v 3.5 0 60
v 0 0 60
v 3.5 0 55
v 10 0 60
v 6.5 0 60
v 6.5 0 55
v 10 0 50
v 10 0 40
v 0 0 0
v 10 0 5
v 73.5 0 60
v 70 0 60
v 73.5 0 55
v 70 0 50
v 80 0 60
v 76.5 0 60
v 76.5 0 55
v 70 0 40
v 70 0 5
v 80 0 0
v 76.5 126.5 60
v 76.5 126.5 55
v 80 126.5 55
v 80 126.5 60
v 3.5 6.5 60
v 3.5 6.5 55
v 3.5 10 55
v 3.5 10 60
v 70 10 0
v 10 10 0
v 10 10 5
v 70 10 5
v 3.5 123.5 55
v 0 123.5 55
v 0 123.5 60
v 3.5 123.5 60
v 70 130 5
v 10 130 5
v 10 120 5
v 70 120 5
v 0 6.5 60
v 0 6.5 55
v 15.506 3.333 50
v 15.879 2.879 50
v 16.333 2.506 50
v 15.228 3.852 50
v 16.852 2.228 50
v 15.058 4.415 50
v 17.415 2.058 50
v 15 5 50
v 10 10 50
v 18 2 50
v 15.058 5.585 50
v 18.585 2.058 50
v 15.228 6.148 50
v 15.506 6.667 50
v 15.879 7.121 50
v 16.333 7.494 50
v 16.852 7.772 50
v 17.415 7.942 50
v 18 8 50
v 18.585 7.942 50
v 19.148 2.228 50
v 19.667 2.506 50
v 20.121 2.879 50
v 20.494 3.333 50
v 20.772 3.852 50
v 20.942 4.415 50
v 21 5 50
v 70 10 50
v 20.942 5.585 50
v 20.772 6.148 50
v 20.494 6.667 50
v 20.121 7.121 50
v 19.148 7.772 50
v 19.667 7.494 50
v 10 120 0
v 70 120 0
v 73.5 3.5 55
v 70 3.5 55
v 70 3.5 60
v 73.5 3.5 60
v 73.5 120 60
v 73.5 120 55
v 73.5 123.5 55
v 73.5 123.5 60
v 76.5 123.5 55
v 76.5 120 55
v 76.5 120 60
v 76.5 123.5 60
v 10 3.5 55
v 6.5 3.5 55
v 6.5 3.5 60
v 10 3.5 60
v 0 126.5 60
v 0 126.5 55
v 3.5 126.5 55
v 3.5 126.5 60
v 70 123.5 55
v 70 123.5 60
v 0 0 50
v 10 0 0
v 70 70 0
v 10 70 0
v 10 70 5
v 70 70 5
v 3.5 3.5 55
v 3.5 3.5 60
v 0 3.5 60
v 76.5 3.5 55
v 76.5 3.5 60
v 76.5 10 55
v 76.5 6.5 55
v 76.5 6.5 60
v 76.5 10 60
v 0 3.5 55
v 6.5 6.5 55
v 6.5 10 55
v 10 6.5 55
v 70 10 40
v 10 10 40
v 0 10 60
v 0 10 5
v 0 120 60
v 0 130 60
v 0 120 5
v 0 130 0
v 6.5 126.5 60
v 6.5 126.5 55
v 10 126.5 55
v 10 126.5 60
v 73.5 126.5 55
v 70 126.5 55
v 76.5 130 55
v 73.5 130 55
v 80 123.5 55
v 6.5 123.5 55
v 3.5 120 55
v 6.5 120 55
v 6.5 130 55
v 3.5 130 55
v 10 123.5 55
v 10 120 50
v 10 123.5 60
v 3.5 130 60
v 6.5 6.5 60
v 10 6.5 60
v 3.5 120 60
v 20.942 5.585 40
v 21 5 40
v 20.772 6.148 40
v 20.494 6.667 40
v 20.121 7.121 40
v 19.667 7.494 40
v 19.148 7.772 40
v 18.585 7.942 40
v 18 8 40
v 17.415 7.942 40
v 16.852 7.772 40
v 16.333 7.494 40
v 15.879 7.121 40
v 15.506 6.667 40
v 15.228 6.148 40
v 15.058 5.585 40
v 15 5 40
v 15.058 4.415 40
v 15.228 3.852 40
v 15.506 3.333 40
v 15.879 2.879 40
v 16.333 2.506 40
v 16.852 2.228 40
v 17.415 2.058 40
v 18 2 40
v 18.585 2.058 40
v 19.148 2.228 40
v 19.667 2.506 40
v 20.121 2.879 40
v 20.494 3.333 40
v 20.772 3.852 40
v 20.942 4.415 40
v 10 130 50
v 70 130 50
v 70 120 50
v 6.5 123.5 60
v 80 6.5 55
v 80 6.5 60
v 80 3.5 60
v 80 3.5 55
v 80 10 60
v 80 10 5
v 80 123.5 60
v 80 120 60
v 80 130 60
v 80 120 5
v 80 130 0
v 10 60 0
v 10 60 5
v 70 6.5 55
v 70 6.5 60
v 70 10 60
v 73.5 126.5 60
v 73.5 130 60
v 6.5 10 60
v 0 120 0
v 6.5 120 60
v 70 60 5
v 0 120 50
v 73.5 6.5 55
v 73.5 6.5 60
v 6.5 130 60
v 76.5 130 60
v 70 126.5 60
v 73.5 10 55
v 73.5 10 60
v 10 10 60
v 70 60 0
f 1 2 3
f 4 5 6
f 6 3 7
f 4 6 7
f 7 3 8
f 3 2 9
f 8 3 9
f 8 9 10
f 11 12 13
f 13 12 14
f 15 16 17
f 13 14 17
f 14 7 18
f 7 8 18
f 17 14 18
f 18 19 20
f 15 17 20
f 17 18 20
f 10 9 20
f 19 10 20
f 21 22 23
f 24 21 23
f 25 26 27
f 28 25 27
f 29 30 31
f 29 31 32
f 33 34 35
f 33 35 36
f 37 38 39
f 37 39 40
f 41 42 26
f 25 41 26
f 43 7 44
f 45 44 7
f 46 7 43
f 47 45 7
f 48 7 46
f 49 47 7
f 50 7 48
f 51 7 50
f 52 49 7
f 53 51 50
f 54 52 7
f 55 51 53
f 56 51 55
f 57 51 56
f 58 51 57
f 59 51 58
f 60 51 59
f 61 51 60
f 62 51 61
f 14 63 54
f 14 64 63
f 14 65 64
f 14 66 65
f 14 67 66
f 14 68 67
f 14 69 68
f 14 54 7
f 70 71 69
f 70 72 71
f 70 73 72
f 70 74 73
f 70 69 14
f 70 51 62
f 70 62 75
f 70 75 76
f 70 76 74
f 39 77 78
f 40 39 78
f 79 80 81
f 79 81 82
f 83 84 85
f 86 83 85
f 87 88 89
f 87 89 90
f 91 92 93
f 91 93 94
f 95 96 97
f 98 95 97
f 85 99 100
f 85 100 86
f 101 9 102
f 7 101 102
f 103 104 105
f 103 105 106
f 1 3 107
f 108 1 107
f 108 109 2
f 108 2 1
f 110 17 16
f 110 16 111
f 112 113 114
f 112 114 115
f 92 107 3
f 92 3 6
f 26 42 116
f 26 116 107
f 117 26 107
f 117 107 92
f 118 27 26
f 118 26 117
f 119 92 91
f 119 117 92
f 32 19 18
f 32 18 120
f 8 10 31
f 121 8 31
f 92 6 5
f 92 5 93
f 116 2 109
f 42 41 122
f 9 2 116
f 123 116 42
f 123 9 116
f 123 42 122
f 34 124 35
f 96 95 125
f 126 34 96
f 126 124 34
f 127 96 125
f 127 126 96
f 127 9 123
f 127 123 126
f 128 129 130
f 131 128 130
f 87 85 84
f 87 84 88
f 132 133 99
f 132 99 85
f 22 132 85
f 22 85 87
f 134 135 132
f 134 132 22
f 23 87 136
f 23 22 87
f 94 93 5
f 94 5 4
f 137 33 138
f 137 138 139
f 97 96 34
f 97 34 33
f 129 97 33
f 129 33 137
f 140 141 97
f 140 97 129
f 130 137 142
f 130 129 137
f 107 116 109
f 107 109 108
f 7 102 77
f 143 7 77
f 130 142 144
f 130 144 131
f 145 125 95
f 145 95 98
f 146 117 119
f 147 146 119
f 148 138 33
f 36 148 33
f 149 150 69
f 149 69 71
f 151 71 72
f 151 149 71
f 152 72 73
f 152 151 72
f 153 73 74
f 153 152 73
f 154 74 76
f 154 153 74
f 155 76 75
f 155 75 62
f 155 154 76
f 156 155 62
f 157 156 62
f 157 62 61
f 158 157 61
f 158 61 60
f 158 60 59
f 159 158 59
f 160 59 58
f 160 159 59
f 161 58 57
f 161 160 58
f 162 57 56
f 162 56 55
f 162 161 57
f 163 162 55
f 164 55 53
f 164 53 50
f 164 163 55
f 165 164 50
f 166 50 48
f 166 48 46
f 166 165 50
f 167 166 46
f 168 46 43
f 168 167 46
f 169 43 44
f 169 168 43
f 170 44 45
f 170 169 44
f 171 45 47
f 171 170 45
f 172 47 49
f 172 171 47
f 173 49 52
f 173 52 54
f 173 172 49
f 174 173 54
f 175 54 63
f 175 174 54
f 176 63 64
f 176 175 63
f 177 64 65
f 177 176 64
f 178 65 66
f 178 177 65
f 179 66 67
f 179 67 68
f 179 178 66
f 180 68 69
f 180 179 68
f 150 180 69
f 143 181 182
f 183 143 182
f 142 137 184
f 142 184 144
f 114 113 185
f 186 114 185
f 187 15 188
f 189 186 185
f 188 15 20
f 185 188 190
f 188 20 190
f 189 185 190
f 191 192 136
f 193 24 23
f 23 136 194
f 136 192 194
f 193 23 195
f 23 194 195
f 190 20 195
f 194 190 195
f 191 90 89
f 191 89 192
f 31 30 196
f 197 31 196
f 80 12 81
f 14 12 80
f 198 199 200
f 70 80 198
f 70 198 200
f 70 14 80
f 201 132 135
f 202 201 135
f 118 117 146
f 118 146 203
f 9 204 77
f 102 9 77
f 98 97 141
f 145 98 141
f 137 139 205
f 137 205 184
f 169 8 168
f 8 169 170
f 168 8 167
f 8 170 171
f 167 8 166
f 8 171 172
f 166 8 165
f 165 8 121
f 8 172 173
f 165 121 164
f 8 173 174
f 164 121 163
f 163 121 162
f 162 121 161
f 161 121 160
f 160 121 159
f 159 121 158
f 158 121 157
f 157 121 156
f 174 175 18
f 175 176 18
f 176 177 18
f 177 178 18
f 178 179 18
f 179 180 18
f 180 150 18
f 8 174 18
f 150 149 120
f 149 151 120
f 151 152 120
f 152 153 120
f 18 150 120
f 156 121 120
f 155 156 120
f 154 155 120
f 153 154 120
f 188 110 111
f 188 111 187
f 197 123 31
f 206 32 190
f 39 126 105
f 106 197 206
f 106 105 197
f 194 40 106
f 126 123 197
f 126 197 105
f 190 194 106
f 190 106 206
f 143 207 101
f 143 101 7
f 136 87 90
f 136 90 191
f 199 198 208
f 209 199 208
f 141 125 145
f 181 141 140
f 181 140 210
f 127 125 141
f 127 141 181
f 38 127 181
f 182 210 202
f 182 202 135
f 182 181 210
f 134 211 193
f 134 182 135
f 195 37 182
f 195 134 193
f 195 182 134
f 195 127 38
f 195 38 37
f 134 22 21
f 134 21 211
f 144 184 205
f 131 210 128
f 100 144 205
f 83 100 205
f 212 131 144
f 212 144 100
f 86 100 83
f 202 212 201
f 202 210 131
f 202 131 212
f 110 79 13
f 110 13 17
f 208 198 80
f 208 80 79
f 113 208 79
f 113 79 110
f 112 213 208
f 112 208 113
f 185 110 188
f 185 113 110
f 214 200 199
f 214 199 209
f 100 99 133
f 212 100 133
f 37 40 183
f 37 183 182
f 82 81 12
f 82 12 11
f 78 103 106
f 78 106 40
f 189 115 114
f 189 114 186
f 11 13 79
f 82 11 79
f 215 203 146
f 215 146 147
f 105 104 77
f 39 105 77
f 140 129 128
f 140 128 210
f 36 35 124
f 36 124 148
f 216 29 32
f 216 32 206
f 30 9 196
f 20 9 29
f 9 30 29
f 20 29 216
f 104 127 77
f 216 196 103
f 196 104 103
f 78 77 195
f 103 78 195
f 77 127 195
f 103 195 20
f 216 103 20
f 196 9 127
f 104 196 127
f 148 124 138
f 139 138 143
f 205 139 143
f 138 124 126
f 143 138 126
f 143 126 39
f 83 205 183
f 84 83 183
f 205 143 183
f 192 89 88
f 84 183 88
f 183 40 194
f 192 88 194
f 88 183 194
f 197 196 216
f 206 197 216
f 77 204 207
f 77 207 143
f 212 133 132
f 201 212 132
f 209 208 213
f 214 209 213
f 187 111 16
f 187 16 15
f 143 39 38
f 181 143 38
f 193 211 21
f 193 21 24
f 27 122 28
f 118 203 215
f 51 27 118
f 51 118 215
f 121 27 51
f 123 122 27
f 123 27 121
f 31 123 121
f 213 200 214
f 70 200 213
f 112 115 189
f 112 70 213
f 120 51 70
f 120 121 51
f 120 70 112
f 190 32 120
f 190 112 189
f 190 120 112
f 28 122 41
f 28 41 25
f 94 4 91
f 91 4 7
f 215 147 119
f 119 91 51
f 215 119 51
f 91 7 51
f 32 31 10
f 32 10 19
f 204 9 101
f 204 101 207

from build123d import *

# Parameters (mm, degrees)
BOX009_W       = 10
BOX009_H       = 120
BOX009_DEPTH   = 50
BOX010_W       = 3
BOX010_H       = 10
BOX010_DEPTH   = 5
BOX011_W       = 10
BOX011_H       = 3
BOX011_DEPTH   = 5
BOX012_W       = 3
BOX012_H       = 10
BOX012_DEPTH   = 5
BOX013_W       = 10
BOX013_H       = 3
BOX013_DEPTH   = 5
BOX014_W       = 3
BOX014_H       = 10
BOX014_DEPTH   = 5
BOX015_W       = 10
BOX015_H       = 3
BOX015_DEPTH   = 5
BOX016_W       = 3
BOX016_H       = 10
BOX016_DEPTH   = 5
BOX017_W       = 10
BOX017_H       = 3
BOX017_DEPTH   = 5
BOX003_W       = 10
BOX003_H       = 10
BOX003_DEPTH   = 60
BOX004_W       = 10
BOX004_H       = 10
BOX004_DEPTH   = 60
BOX005_W       = 10
BOX005_H       = 10
BOX005_DEPTH   = 60
BOX006_W       = 10
BOX006_H       = 10
BOX006_DEPTH   = 60
BOX008_W       = 80
BOX008_H       = 10
BOX008_DEPTH   = 10
BOX001_W       = 60
BOX001_H       = 50
BOX001_DEPTH   = 5
BOX002_W       = 60
BOX002_H       = 50
BOX002_DEPTH   = 5
BOX_W          = 80
BOX_H          = 130
BOX_DEPTH      = 5
CYLINDER_R     = 3
CYLINDER_DEPTH = 10
BOX007_W       = 80
BOX007_H       = 10
BOX007_DEPTH   = 10


with BuildPart() as cube009:
    # Box009 → Box009 (new body)
    with BuildSketch(Plane.XY):
        with Locations((5, 60)):
            Rectangle(BOX009_W, BOX009_H)
    extrude(amount=BOX009_DEPTH)


with BuildPart() as cube010:
    # Box010 → Box010 (new body)
    with BuildSketch(Plane(origin=(3.5, 0, 55), x_dir=(1, 0, 0), z_dir=(0, 0, 1))):
        with Locations((1.5, 5)):
            Rectangle(BOX010_W, BOX010_H)
    extrude(amount=BOX010_DEPTH)


with BuildPart() as fusion001:
    # Box011 → Box011 (new body)
    with BuildSketch(Plane(origin=(0, 3.5, 55), x_dir=(1, 0, 0), z_dir=(0, 0, 1))):
        with Locations((5, 1.5)):
            Rectangle(BOX011_W, BOX011_H)
    extrude(amount=BOX011_DEPTH)

    # Fusion001: union Cube010
    add(cube010.part)


with BuildPart() as cube012:
    # Box012 → Box012 (new body)
    with BuildSketch(Plane(origin=(3.5, 0, 55), x_dir=(1, 0, 0), z_dir=(0, 0, 1))):
        with Locations((1.5, 5)):
            Rectangle(BOX012_W, BOX012_H)
    extrude(amount=BOX012_DEPTH)


with BuildPart() as fusion002:
    # Box013 → Box013 (new body)
    with BuildSketch(Plane(origin=(0, 3.5, 55), x_dir=(1, 0, 0), z_dir=(0, 0, 1))):
        with Locations((5, 1.5)):
            Rectangle(BOX013_W, BOX013_H)
    extrude(amount=BOX013_DEPTH)

    # Fusion002: union Cube012
    add(cube012.part)


with BuildPart() as fusion002_1:
    # Fusion002 placement: moved
    add(fusion002.part.moved(Location((0, 120, 0))))


with BuildPart() as cube014:
    # Box014 → Box014 (new body)
    with BuildSketch(Plane(origin=(3.5, 0, 55), x_dir=(1, 0, 0), z_dir=(0, 0, 1))):
        with Locations((1.5, 5)):
            Rectangle(BOX014_W, BOX014_H)
    extrude(amount=BOX014_DEPTH)


with BuildPart() as fusion003:
    # Box015 → Box015 (new body)
    with BuildSketch(Plane(origin=(0, 3.5, 55), x_dir=(1, 0, 0), z_dir=(0, 0, 1))):
        with Locations((5, 1.5)):
            Rectangle(BOX015_W, BOX015_H)
    extrude(amount=BOX015_DEPTH)

    # Fusion003: union Cube014
    add(cube014.part)


with BuildPart() as fusion003_1:
    # Fusion003 placement: moved
    add(fusion003.part.moved(Location((70, 0, 0))))


with BuildPart() as cube016:
    # Box016 → Box016 (new body)
    with BuildSketch(Plane(origin=(3.5, 0, 55), x_dir=(1, 0, 0), z_dir=(0, 0, 1))):
        with Locations((1.5, 5)):
            Rectangle(BOX016_W, BOX016_H)
    extrude(amount=BOX016_DEPTH)


with BuildPart() as fusion005:
    # Box017 → Box017 (new body)
    with BuildSketch(Plane(origin=(0, 3.5, 55), x_dir=(1, 0, 0), z_dir=(0, 0, 1))):
        with Locations((5, 1.5)):
            Rectangle(BOX017_W, BOX017_H)
    extrude(amount=BOX017_DEPTH)

    # Fusion004: union Cube016
    add(cube016.part)


with BuildPart() as fusion005_1:
    # Fusion004 placement: moved
    add(fusion005.part.moved(Location((70, 120, 0))))

    # Fusion005: union Fusion001, Fusion002, Fusion003
    add(fusion001.part)
    add(fusion002_1.part)
    add(fusion003_1.part)


with BuildPart() as cube003:
    # Box003 → Box003 (new body)
    with BuildSketch(Plane.XY):
        with Locations((5, 5)):
            Rectangle(BOX003_W, BOX003_H)
    extrude(amount=BOX003_DEPTH)


with BuildPart() as cube004:
    # Box004 → Box004 (new body)
    with BuildSketch(Plane(origin=(0, 120, 0), x_dir=(1, 0, 0), z_dir=(0, 0, 1))):
        with Locations((5, 5)):
            Rectangle(BOX004_W, BOX004_H)
    extrude(amount=BOX004_DEPTH)


with BuildPart() as cube005:
    # Box005 → Box005 (new body)
    with BuildSketch(Plane(origin=(70, 120, 0), x_dir=(1, 0, 0), z_dir=(0, 0, 1))):
        with Locations((5, 5)):
            Rectangle(BOX005_W, BOX005_H)
    extrude(amount=BOX005_DEPTH)


with BuildPart() as cube006:
    # Box006 → Box006 (new body)
    with BuildSketch(Plane(origin=(70, 0, 0), x_dir=(1, 0, 0), z_dir=(0, 0, 1))):
        with Locations((5, 5)):
            Rectangle(BOX006_W, BOX006_H)
    extrude(amount=BOX006_DEPTH)


with BuildPart() as cube008:
    # Box008 → Box008 (new body)
    with BuildSketch(Plane(origin=(0, 120, 50), x_dir=(1, 0, 0), z_dir=(0, 0, 1))):
        with Locations((40, 5)):
            Rectangle(BOX008_W, BOX008_H)
    extrude(amount=BOX008_DEPTH)


with BuildPart() as cube001:
    # Box001 → Box001 (new body)
    with BuildSketch(Plane(origin=(10, 10, 0), x_dir=(1, 0, 0), z_dir=(0, 0, 1))):
        with Locations((30, 25)):
            Rectangle(BOX001_W, BOX001_H)
    extrude(amount=BOX001_DEPTH)


with BuildPart() as fusion:
    # Box002 → Box002 (new body)
    with BuildSketch(Plane(origin=(10, 70, 0), x_dir=(1, 0, 0), z_dir=(0, 0, 1))):
        with Locations((30, 25)):
            Rectangle(BOX002_W, BOX002_H)
    extrude(amount=BOX002_DEPTH)

    # Fusion: union Cube001
    add(cube001.part)


with BuildPart() as cut:
    # Box → Box (new body)
    with BuildSketch(Plane.XY):
        with Locations((40, 65)):
            Rectangle(BOX_W, BOX_H)
    extrude(amount=BOX_DEPTH)

    # Cut: cut Fusion
    add(fusion.part, mode=Mode.SUBTRACT)


with BuildPart() as cylinder:
    # Cylinder → Cylinder (new body)
    with BuildSketch(Plane(origin=(18, 5, 50), x_dir=(1, 0, 0), z_dir=(0, 0, 1))):
        Circle(CYLINDER_R)
    extrude(amount=CYLINDER_DEPTH)


with BuildPart() as cut002:
    # Box007 → Box007 (new body)
    with BuildSketch(Plane.XY.offset(50)):
        with Locations((40, 5)):
            Rectangle(BOX007_W, BOX007_H)
    extrude(amount=BOX007_DEPTH)

    # Cut001: cut Cylinder
    add(cylinder.part, mode=Mode.SUBTRACT)


with BuildPart() as cut002_1:
    # Cut001 placement: moved
    add(cut002.part.moved(Location((0, 0, -10))))

    # Fusion006: union Cube003, Cube004, Cube005, Cube006, Cube008, Cut
    add(cube003.part)
    add(cube004.part)
    add(cube005.part)
    add(cube006.part)
    add(cube008.part)
    add(cut.part)

    # Cut002: cut Fusion005
    add(fusion005_1.part, mode=Mode.SUBTRACT)


solid = Compound([cube009.part, cut002_1.part])
